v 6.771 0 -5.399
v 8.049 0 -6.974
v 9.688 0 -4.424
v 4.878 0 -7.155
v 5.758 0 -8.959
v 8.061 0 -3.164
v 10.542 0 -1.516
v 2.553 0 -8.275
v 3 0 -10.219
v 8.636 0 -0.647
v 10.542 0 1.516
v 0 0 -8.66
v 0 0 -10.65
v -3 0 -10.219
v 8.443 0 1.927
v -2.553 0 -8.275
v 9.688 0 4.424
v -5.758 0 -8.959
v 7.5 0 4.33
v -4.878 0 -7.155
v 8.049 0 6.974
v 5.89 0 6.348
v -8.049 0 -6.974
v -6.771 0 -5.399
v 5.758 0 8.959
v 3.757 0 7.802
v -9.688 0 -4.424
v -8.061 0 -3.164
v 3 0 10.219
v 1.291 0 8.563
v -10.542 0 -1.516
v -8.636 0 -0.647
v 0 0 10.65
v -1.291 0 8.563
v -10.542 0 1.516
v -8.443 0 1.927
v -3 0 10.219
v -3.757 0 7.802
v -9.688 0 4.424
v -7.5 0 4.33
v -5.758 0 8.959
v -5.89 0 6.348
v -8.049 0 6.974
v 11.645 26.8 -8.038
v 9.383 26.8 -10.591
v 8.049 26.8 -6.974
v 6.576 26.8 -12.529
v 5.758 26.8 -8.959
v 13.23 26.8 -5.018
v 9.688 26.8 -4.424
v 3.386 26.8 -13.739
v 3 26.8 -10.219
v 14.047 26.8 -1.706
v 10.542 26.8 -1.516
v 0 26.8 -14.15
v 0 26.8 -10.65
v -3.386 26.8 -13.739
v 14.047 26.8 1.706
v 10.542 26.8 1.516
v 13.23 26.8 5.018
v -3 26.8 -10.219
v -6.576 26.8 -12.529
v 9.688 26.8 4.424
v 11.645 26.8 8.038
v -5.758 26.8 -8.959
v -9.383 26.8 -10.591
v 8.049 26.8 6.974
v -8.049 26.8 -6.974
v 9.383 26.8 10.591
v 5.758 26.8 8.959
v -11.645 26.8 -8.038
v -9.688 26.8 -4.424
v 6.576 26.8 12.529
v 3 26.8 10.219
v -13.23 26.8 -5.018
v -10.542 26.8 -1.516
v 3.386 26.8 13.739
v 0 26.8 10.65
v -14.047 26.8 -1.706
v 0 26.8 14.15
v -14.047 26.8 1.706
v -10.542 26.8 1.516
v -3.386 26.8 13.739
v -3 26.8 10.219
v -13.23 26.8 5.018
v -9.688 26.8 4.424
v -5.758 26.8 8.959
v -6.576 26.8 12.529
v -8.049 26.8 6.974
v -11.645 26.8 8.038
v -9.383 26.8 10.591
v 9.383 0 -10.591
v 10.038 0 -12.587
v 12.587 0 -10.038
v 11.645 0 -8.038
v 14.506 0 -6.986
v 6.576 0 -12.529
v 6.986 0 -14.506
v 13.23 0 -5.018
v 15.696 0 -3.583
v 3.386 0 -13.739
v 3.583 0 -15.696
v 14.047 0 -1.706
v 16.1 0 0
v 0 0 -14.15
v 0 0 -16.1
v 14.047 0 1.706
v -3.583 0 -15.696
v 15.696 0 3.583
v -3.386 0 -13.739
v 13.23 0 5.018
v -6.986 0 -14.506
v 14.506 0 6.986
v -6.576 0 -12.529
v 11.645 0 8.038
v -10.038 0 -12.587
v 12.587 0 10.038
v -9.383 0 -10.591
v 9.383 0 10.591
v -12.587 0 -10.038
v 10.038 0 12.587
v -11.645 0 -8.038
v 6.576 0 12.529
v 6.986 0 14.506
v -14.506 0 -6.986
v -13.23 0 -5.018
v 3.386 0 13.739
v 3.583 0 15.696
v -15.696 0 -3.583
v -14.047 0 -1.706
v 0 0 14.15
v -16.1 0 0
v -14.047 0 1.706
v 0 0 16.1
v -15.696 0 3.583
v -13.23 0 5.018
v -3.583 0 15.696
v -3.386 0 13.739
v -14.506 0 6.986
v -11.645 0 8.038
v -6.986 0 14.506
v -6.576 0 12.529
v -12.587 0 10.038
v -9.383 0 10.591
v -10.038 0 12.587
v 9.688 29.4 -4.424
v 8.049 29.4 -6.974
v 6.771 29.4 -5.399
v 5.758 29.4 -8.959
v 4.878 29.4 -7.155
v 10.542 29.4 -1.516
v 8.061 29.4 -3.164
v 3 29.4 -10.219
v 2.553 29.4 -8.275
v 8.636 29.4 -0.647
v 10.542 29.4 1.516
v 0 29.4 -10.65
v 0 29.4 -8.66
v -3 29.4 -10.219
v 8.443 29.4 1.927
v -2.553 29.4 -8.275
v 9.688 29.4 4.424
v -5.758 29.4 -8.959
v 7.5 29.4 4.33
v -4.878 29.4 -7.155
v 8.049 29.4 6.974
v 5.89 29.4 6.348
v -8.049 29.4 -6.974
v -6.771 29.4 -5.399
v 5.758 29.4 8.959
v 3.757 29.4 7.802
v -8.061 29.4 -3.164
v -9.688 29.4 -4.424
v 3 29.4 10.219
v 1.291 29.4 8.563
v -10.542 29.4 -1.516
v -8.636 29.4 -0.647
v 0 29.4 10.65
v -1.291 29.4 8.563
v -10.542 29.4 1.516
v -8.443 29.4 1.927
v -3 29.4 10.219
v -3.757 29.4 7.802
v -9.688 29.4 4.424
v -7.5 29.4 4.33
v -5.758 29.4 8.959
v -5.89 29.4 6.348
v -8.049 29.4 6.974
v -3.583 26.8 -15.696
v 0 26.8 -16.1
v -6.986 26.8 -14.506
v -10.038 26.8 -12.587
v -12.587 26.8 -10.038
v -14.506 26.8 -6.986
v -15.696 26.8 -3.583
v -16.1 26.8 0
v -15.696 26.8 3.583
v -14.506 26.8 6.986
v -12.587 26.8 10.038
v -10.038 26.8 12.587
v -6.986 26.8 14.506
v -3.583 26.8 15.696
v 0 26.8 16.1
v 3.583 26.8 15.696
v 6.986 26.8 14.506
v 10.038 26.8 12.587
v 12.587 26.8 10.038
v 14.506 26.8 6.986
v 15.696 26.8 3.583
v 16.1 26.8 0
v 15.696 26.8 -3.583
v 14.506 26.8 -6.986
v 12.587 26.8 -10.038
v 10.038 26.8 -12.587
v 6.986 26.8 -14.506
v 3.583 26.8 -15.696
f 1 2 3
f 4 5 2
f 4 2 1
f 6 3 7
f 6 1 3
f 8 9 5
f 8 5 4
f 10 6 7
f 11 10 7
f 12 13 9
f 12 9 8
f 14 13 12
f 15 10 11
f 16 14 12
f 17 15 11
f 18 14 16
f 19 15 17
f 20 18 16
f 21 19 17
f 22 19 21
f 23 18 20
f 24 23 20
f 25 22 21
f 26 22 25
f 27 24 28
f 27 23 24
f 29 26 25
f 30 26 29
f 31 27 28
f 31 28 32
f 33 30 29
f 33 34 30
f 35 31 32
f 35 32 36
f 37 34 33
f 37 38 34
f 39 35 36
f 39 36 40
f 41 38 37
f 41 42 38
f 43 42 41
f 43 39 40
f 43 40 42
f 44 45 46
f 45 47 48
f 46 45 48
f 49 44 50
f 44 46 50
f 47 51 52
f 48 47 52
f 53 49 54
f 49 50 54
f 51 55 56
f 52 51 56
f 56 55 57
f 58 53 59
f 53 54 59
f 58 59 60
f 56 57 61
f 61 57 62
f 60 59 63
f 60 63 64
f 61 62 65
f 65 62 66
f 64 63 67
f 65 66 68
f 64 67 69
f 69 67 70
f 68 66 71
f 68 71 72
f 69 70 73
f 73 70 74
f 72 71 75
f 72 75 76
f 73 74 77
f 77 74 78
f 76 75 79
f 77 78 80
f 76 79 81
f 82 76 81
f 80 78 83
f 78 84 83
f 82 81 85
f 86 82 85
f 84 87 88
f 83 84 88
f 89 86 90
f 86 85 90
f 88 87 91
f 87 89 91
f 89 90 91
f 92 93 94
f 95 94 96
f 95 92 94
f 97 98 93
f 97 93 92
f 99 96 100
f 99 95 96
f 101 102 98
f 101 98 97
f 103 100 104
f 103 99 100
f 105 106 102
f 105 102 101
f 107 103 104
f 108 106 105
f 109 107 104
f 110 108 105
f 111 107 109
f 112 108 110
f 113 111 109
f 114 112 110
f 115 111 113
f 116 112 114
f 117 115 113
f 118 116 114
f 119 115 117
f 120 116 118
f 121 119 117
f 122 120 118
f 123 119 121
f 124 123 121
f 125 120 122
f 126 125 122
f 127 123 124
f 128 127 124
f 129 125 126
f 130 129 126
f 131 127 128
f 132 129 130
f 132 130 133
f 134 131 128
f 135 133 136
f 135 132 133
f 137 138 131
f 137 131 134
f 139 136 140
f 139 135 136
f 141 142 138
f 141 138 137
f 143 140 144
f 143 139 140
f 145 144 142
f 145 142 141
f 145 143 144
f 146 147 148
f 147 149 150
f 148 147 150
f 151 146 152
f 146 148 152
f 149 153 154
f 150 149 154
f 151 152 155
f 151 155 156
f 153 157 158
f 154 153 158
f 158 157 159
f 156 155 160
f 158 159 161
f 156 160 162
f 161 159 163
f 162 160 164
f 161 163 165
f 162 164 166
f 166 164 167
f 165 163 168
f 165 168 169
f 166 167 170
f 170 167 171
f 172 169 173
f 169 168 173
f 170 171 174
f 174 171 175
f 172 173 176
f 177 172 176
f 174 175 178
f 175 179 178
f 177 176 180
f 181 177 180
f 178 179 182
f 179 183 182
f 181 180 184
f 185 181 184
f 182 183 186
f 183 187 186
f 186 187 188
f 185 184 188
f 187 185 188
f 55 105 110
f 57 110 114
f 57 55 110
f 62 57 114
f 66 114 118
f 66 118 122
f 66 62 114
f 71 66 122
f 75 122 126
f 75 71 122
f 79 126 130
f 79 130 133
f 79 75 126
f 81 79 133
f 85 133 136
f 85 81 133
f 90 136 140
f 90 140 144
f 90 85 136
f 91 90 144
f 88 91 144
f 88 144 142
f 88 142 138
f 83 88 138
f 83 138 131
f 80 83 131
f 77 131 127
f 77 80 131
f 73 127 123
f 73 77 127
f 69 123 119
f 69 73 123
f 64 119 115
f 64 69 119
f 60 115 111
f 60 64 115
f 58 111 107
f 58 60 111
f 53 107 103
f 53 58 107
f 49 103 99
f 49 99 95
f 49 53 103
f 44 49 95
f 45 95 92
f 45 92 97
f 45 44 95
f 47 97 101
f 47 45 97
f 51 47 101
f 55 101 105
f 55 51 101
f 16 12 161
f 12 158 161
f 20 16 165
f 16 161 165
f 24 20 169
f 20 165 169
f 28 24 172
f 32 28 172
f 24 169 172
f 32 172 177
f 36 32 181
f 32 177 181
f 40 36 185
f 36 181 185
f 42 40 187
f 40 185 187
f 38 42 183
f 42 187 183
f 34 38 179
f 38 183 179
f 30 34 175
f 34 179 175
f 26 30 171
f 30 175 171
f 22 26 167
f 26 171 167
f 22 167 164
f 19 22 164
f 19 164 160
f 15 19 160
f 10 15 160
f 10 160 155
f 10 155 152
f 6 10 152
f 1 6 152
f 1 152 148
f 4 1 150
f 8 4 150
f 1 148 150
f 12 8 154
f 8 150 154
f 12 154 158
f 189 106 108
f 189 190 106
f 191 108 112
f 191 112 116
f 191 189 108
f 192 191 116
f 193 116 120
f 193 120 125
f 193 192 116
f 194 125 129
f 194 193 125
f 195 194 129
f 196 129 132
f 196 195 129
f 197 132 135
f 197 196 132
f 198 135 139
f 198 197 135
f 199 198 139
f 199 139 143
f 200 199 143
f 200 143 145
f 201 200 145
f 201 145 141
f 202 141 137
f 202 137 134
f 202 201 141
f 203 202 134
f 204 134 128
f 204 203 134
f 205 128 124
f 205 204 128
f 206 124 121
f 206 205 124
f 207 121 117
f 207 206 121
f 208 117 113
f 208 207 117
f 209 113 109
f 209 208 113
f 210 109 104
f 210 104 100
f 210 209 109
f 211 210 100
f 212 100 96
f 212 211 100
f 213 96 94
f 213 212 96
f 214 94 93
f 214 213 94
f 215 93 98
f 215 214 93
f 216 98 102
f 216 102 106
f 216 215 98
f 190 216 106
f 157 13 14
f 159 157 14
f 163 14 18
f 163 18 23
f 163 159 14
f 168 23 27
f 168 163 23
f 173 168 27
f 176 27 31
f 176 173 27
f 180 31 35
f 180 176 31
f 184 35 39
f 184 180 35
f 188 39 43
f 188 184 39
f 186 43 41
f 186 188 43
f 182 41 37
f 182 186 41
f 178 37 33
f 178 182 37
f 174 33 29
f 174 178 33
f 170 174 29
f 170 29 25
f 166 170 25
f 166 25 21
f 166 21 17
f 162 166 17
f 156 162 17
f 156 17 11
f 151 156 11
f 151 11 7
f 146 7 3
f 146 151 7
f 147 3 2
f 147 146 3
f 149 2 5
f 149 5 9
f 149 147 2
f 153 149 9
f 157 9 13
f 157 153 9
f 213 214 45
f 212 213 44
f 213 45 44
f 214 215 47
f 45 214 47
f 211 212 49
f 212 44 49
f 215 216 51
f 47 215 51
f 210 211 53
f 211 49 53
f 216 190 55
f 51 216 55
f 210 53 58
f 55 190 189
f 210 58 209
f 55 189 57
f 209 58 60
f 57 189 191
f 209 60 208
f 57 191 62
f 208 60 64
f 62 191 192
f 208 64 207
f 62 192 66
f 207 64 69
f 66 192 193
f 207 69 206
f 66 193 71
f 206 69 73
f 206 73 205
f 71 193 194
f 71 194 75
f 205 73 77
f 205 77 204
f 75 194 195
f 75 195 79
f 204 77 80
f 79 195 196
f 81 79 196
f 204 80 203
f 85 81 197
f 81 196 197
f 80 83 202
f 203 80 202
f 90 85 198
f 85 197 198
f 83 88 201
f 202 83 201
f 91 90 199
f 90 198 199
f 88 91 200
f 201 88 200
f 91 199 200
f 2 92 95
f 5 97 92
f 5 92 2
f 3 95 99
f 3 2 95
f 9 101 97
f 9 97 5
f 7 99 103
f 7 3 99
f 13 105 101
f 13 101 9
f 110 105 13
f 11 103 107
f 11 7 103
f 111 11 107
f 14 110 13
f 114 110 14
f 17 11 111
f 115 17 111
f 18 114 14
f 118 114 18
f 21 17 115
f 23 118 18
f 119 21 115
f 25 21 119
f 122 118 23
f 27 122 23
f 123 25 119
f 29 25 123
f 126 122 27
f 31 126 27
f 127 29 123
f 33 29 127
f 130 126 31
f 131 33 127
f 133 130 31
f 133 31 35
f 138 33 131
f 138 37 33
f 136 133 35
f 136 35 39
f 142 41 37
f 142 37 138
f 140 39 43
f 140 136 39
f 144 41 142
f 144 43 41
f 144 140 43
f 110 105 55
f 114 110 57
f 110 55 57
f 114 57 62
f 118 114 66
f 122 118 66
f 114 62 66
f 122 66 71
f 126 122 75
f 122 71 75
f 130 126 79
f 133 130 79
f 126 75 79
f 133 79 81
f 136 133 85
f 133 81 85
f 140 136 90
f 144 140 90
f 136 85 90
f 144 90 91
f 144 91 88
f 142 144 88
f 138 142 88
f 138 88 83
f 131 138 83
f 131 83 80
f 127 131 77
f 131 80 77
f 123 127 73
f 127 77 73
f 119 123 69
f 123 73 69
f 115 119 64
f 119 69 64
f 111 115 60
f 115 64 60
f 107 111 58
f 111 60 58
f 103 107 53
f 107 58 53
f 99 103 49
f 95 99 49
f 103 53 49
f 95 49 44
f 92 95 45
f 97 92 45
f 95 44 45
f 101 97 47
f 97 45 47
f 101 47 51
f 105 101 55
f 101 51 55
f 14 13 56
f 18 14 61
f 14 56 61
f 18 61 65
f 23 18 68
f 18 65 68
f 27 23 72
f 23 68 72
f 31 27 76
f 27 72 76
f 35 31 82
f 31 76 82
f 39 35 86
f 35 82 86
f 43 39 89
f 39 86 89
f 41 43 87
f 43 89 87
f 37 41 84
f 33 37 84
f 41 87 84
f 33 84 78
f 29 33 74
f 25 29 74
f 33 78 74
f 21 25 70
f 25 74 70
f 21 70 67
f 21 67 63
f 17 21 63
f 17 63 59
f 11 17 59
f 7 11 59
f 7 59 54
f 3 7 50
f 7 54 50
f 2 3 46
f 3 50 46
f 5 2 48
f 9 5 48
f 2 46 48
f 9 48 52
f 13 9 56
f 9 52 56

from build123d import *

# Parameters (mm, degrees)
IZIM1_W   = 1.99
IZIM1_H   = 29.4
IZIM1_W_2 = 1.95
IZIM1_H_2 = 26.8
IZIM4_W   = 3.5
IZIM4_H   = 26.8


with BuildPart() as part:
    # Çizim1 → Döndür1 (revolve)
    with BuildSketch(Plane.XY, mode=Mode.PRIVATE) as d_nd_r1_sk:
        with Locations((9.655, 14.7)):
            Rectangle(IZIM1_W, IZIM1_H)
        with Locations((15.125, 13.4)):
            Rectangle(IZIM1_W_2, IZIM1_H_2)
    revolve(d_nd_r1_sk.sketch.rotate(Axis((0, 0, 0), (0, 1, 0)), 90), axis=Axis((0, 0, 0), (0, 1, 0)))


with BuildPart() as body_2:
    # Çizim4 → Döndür3 (revolve)
    with BuildSketch(Plane.XY, mode=Mode.PRIVATE) as d_nd_r3_sk:
        with Locations((12.4, 13.4)):
            Rectangle(IZIM4_W, IZIM4_H)
    revolve(d_nd_r3_sk.sketch.rotate(Axis((0, 0, 0), (0, 1, 0)), 90), axis=Axis((0, 0, 0), (0, 1, 0)))


solid = Compound([part.part, body_2.part])
